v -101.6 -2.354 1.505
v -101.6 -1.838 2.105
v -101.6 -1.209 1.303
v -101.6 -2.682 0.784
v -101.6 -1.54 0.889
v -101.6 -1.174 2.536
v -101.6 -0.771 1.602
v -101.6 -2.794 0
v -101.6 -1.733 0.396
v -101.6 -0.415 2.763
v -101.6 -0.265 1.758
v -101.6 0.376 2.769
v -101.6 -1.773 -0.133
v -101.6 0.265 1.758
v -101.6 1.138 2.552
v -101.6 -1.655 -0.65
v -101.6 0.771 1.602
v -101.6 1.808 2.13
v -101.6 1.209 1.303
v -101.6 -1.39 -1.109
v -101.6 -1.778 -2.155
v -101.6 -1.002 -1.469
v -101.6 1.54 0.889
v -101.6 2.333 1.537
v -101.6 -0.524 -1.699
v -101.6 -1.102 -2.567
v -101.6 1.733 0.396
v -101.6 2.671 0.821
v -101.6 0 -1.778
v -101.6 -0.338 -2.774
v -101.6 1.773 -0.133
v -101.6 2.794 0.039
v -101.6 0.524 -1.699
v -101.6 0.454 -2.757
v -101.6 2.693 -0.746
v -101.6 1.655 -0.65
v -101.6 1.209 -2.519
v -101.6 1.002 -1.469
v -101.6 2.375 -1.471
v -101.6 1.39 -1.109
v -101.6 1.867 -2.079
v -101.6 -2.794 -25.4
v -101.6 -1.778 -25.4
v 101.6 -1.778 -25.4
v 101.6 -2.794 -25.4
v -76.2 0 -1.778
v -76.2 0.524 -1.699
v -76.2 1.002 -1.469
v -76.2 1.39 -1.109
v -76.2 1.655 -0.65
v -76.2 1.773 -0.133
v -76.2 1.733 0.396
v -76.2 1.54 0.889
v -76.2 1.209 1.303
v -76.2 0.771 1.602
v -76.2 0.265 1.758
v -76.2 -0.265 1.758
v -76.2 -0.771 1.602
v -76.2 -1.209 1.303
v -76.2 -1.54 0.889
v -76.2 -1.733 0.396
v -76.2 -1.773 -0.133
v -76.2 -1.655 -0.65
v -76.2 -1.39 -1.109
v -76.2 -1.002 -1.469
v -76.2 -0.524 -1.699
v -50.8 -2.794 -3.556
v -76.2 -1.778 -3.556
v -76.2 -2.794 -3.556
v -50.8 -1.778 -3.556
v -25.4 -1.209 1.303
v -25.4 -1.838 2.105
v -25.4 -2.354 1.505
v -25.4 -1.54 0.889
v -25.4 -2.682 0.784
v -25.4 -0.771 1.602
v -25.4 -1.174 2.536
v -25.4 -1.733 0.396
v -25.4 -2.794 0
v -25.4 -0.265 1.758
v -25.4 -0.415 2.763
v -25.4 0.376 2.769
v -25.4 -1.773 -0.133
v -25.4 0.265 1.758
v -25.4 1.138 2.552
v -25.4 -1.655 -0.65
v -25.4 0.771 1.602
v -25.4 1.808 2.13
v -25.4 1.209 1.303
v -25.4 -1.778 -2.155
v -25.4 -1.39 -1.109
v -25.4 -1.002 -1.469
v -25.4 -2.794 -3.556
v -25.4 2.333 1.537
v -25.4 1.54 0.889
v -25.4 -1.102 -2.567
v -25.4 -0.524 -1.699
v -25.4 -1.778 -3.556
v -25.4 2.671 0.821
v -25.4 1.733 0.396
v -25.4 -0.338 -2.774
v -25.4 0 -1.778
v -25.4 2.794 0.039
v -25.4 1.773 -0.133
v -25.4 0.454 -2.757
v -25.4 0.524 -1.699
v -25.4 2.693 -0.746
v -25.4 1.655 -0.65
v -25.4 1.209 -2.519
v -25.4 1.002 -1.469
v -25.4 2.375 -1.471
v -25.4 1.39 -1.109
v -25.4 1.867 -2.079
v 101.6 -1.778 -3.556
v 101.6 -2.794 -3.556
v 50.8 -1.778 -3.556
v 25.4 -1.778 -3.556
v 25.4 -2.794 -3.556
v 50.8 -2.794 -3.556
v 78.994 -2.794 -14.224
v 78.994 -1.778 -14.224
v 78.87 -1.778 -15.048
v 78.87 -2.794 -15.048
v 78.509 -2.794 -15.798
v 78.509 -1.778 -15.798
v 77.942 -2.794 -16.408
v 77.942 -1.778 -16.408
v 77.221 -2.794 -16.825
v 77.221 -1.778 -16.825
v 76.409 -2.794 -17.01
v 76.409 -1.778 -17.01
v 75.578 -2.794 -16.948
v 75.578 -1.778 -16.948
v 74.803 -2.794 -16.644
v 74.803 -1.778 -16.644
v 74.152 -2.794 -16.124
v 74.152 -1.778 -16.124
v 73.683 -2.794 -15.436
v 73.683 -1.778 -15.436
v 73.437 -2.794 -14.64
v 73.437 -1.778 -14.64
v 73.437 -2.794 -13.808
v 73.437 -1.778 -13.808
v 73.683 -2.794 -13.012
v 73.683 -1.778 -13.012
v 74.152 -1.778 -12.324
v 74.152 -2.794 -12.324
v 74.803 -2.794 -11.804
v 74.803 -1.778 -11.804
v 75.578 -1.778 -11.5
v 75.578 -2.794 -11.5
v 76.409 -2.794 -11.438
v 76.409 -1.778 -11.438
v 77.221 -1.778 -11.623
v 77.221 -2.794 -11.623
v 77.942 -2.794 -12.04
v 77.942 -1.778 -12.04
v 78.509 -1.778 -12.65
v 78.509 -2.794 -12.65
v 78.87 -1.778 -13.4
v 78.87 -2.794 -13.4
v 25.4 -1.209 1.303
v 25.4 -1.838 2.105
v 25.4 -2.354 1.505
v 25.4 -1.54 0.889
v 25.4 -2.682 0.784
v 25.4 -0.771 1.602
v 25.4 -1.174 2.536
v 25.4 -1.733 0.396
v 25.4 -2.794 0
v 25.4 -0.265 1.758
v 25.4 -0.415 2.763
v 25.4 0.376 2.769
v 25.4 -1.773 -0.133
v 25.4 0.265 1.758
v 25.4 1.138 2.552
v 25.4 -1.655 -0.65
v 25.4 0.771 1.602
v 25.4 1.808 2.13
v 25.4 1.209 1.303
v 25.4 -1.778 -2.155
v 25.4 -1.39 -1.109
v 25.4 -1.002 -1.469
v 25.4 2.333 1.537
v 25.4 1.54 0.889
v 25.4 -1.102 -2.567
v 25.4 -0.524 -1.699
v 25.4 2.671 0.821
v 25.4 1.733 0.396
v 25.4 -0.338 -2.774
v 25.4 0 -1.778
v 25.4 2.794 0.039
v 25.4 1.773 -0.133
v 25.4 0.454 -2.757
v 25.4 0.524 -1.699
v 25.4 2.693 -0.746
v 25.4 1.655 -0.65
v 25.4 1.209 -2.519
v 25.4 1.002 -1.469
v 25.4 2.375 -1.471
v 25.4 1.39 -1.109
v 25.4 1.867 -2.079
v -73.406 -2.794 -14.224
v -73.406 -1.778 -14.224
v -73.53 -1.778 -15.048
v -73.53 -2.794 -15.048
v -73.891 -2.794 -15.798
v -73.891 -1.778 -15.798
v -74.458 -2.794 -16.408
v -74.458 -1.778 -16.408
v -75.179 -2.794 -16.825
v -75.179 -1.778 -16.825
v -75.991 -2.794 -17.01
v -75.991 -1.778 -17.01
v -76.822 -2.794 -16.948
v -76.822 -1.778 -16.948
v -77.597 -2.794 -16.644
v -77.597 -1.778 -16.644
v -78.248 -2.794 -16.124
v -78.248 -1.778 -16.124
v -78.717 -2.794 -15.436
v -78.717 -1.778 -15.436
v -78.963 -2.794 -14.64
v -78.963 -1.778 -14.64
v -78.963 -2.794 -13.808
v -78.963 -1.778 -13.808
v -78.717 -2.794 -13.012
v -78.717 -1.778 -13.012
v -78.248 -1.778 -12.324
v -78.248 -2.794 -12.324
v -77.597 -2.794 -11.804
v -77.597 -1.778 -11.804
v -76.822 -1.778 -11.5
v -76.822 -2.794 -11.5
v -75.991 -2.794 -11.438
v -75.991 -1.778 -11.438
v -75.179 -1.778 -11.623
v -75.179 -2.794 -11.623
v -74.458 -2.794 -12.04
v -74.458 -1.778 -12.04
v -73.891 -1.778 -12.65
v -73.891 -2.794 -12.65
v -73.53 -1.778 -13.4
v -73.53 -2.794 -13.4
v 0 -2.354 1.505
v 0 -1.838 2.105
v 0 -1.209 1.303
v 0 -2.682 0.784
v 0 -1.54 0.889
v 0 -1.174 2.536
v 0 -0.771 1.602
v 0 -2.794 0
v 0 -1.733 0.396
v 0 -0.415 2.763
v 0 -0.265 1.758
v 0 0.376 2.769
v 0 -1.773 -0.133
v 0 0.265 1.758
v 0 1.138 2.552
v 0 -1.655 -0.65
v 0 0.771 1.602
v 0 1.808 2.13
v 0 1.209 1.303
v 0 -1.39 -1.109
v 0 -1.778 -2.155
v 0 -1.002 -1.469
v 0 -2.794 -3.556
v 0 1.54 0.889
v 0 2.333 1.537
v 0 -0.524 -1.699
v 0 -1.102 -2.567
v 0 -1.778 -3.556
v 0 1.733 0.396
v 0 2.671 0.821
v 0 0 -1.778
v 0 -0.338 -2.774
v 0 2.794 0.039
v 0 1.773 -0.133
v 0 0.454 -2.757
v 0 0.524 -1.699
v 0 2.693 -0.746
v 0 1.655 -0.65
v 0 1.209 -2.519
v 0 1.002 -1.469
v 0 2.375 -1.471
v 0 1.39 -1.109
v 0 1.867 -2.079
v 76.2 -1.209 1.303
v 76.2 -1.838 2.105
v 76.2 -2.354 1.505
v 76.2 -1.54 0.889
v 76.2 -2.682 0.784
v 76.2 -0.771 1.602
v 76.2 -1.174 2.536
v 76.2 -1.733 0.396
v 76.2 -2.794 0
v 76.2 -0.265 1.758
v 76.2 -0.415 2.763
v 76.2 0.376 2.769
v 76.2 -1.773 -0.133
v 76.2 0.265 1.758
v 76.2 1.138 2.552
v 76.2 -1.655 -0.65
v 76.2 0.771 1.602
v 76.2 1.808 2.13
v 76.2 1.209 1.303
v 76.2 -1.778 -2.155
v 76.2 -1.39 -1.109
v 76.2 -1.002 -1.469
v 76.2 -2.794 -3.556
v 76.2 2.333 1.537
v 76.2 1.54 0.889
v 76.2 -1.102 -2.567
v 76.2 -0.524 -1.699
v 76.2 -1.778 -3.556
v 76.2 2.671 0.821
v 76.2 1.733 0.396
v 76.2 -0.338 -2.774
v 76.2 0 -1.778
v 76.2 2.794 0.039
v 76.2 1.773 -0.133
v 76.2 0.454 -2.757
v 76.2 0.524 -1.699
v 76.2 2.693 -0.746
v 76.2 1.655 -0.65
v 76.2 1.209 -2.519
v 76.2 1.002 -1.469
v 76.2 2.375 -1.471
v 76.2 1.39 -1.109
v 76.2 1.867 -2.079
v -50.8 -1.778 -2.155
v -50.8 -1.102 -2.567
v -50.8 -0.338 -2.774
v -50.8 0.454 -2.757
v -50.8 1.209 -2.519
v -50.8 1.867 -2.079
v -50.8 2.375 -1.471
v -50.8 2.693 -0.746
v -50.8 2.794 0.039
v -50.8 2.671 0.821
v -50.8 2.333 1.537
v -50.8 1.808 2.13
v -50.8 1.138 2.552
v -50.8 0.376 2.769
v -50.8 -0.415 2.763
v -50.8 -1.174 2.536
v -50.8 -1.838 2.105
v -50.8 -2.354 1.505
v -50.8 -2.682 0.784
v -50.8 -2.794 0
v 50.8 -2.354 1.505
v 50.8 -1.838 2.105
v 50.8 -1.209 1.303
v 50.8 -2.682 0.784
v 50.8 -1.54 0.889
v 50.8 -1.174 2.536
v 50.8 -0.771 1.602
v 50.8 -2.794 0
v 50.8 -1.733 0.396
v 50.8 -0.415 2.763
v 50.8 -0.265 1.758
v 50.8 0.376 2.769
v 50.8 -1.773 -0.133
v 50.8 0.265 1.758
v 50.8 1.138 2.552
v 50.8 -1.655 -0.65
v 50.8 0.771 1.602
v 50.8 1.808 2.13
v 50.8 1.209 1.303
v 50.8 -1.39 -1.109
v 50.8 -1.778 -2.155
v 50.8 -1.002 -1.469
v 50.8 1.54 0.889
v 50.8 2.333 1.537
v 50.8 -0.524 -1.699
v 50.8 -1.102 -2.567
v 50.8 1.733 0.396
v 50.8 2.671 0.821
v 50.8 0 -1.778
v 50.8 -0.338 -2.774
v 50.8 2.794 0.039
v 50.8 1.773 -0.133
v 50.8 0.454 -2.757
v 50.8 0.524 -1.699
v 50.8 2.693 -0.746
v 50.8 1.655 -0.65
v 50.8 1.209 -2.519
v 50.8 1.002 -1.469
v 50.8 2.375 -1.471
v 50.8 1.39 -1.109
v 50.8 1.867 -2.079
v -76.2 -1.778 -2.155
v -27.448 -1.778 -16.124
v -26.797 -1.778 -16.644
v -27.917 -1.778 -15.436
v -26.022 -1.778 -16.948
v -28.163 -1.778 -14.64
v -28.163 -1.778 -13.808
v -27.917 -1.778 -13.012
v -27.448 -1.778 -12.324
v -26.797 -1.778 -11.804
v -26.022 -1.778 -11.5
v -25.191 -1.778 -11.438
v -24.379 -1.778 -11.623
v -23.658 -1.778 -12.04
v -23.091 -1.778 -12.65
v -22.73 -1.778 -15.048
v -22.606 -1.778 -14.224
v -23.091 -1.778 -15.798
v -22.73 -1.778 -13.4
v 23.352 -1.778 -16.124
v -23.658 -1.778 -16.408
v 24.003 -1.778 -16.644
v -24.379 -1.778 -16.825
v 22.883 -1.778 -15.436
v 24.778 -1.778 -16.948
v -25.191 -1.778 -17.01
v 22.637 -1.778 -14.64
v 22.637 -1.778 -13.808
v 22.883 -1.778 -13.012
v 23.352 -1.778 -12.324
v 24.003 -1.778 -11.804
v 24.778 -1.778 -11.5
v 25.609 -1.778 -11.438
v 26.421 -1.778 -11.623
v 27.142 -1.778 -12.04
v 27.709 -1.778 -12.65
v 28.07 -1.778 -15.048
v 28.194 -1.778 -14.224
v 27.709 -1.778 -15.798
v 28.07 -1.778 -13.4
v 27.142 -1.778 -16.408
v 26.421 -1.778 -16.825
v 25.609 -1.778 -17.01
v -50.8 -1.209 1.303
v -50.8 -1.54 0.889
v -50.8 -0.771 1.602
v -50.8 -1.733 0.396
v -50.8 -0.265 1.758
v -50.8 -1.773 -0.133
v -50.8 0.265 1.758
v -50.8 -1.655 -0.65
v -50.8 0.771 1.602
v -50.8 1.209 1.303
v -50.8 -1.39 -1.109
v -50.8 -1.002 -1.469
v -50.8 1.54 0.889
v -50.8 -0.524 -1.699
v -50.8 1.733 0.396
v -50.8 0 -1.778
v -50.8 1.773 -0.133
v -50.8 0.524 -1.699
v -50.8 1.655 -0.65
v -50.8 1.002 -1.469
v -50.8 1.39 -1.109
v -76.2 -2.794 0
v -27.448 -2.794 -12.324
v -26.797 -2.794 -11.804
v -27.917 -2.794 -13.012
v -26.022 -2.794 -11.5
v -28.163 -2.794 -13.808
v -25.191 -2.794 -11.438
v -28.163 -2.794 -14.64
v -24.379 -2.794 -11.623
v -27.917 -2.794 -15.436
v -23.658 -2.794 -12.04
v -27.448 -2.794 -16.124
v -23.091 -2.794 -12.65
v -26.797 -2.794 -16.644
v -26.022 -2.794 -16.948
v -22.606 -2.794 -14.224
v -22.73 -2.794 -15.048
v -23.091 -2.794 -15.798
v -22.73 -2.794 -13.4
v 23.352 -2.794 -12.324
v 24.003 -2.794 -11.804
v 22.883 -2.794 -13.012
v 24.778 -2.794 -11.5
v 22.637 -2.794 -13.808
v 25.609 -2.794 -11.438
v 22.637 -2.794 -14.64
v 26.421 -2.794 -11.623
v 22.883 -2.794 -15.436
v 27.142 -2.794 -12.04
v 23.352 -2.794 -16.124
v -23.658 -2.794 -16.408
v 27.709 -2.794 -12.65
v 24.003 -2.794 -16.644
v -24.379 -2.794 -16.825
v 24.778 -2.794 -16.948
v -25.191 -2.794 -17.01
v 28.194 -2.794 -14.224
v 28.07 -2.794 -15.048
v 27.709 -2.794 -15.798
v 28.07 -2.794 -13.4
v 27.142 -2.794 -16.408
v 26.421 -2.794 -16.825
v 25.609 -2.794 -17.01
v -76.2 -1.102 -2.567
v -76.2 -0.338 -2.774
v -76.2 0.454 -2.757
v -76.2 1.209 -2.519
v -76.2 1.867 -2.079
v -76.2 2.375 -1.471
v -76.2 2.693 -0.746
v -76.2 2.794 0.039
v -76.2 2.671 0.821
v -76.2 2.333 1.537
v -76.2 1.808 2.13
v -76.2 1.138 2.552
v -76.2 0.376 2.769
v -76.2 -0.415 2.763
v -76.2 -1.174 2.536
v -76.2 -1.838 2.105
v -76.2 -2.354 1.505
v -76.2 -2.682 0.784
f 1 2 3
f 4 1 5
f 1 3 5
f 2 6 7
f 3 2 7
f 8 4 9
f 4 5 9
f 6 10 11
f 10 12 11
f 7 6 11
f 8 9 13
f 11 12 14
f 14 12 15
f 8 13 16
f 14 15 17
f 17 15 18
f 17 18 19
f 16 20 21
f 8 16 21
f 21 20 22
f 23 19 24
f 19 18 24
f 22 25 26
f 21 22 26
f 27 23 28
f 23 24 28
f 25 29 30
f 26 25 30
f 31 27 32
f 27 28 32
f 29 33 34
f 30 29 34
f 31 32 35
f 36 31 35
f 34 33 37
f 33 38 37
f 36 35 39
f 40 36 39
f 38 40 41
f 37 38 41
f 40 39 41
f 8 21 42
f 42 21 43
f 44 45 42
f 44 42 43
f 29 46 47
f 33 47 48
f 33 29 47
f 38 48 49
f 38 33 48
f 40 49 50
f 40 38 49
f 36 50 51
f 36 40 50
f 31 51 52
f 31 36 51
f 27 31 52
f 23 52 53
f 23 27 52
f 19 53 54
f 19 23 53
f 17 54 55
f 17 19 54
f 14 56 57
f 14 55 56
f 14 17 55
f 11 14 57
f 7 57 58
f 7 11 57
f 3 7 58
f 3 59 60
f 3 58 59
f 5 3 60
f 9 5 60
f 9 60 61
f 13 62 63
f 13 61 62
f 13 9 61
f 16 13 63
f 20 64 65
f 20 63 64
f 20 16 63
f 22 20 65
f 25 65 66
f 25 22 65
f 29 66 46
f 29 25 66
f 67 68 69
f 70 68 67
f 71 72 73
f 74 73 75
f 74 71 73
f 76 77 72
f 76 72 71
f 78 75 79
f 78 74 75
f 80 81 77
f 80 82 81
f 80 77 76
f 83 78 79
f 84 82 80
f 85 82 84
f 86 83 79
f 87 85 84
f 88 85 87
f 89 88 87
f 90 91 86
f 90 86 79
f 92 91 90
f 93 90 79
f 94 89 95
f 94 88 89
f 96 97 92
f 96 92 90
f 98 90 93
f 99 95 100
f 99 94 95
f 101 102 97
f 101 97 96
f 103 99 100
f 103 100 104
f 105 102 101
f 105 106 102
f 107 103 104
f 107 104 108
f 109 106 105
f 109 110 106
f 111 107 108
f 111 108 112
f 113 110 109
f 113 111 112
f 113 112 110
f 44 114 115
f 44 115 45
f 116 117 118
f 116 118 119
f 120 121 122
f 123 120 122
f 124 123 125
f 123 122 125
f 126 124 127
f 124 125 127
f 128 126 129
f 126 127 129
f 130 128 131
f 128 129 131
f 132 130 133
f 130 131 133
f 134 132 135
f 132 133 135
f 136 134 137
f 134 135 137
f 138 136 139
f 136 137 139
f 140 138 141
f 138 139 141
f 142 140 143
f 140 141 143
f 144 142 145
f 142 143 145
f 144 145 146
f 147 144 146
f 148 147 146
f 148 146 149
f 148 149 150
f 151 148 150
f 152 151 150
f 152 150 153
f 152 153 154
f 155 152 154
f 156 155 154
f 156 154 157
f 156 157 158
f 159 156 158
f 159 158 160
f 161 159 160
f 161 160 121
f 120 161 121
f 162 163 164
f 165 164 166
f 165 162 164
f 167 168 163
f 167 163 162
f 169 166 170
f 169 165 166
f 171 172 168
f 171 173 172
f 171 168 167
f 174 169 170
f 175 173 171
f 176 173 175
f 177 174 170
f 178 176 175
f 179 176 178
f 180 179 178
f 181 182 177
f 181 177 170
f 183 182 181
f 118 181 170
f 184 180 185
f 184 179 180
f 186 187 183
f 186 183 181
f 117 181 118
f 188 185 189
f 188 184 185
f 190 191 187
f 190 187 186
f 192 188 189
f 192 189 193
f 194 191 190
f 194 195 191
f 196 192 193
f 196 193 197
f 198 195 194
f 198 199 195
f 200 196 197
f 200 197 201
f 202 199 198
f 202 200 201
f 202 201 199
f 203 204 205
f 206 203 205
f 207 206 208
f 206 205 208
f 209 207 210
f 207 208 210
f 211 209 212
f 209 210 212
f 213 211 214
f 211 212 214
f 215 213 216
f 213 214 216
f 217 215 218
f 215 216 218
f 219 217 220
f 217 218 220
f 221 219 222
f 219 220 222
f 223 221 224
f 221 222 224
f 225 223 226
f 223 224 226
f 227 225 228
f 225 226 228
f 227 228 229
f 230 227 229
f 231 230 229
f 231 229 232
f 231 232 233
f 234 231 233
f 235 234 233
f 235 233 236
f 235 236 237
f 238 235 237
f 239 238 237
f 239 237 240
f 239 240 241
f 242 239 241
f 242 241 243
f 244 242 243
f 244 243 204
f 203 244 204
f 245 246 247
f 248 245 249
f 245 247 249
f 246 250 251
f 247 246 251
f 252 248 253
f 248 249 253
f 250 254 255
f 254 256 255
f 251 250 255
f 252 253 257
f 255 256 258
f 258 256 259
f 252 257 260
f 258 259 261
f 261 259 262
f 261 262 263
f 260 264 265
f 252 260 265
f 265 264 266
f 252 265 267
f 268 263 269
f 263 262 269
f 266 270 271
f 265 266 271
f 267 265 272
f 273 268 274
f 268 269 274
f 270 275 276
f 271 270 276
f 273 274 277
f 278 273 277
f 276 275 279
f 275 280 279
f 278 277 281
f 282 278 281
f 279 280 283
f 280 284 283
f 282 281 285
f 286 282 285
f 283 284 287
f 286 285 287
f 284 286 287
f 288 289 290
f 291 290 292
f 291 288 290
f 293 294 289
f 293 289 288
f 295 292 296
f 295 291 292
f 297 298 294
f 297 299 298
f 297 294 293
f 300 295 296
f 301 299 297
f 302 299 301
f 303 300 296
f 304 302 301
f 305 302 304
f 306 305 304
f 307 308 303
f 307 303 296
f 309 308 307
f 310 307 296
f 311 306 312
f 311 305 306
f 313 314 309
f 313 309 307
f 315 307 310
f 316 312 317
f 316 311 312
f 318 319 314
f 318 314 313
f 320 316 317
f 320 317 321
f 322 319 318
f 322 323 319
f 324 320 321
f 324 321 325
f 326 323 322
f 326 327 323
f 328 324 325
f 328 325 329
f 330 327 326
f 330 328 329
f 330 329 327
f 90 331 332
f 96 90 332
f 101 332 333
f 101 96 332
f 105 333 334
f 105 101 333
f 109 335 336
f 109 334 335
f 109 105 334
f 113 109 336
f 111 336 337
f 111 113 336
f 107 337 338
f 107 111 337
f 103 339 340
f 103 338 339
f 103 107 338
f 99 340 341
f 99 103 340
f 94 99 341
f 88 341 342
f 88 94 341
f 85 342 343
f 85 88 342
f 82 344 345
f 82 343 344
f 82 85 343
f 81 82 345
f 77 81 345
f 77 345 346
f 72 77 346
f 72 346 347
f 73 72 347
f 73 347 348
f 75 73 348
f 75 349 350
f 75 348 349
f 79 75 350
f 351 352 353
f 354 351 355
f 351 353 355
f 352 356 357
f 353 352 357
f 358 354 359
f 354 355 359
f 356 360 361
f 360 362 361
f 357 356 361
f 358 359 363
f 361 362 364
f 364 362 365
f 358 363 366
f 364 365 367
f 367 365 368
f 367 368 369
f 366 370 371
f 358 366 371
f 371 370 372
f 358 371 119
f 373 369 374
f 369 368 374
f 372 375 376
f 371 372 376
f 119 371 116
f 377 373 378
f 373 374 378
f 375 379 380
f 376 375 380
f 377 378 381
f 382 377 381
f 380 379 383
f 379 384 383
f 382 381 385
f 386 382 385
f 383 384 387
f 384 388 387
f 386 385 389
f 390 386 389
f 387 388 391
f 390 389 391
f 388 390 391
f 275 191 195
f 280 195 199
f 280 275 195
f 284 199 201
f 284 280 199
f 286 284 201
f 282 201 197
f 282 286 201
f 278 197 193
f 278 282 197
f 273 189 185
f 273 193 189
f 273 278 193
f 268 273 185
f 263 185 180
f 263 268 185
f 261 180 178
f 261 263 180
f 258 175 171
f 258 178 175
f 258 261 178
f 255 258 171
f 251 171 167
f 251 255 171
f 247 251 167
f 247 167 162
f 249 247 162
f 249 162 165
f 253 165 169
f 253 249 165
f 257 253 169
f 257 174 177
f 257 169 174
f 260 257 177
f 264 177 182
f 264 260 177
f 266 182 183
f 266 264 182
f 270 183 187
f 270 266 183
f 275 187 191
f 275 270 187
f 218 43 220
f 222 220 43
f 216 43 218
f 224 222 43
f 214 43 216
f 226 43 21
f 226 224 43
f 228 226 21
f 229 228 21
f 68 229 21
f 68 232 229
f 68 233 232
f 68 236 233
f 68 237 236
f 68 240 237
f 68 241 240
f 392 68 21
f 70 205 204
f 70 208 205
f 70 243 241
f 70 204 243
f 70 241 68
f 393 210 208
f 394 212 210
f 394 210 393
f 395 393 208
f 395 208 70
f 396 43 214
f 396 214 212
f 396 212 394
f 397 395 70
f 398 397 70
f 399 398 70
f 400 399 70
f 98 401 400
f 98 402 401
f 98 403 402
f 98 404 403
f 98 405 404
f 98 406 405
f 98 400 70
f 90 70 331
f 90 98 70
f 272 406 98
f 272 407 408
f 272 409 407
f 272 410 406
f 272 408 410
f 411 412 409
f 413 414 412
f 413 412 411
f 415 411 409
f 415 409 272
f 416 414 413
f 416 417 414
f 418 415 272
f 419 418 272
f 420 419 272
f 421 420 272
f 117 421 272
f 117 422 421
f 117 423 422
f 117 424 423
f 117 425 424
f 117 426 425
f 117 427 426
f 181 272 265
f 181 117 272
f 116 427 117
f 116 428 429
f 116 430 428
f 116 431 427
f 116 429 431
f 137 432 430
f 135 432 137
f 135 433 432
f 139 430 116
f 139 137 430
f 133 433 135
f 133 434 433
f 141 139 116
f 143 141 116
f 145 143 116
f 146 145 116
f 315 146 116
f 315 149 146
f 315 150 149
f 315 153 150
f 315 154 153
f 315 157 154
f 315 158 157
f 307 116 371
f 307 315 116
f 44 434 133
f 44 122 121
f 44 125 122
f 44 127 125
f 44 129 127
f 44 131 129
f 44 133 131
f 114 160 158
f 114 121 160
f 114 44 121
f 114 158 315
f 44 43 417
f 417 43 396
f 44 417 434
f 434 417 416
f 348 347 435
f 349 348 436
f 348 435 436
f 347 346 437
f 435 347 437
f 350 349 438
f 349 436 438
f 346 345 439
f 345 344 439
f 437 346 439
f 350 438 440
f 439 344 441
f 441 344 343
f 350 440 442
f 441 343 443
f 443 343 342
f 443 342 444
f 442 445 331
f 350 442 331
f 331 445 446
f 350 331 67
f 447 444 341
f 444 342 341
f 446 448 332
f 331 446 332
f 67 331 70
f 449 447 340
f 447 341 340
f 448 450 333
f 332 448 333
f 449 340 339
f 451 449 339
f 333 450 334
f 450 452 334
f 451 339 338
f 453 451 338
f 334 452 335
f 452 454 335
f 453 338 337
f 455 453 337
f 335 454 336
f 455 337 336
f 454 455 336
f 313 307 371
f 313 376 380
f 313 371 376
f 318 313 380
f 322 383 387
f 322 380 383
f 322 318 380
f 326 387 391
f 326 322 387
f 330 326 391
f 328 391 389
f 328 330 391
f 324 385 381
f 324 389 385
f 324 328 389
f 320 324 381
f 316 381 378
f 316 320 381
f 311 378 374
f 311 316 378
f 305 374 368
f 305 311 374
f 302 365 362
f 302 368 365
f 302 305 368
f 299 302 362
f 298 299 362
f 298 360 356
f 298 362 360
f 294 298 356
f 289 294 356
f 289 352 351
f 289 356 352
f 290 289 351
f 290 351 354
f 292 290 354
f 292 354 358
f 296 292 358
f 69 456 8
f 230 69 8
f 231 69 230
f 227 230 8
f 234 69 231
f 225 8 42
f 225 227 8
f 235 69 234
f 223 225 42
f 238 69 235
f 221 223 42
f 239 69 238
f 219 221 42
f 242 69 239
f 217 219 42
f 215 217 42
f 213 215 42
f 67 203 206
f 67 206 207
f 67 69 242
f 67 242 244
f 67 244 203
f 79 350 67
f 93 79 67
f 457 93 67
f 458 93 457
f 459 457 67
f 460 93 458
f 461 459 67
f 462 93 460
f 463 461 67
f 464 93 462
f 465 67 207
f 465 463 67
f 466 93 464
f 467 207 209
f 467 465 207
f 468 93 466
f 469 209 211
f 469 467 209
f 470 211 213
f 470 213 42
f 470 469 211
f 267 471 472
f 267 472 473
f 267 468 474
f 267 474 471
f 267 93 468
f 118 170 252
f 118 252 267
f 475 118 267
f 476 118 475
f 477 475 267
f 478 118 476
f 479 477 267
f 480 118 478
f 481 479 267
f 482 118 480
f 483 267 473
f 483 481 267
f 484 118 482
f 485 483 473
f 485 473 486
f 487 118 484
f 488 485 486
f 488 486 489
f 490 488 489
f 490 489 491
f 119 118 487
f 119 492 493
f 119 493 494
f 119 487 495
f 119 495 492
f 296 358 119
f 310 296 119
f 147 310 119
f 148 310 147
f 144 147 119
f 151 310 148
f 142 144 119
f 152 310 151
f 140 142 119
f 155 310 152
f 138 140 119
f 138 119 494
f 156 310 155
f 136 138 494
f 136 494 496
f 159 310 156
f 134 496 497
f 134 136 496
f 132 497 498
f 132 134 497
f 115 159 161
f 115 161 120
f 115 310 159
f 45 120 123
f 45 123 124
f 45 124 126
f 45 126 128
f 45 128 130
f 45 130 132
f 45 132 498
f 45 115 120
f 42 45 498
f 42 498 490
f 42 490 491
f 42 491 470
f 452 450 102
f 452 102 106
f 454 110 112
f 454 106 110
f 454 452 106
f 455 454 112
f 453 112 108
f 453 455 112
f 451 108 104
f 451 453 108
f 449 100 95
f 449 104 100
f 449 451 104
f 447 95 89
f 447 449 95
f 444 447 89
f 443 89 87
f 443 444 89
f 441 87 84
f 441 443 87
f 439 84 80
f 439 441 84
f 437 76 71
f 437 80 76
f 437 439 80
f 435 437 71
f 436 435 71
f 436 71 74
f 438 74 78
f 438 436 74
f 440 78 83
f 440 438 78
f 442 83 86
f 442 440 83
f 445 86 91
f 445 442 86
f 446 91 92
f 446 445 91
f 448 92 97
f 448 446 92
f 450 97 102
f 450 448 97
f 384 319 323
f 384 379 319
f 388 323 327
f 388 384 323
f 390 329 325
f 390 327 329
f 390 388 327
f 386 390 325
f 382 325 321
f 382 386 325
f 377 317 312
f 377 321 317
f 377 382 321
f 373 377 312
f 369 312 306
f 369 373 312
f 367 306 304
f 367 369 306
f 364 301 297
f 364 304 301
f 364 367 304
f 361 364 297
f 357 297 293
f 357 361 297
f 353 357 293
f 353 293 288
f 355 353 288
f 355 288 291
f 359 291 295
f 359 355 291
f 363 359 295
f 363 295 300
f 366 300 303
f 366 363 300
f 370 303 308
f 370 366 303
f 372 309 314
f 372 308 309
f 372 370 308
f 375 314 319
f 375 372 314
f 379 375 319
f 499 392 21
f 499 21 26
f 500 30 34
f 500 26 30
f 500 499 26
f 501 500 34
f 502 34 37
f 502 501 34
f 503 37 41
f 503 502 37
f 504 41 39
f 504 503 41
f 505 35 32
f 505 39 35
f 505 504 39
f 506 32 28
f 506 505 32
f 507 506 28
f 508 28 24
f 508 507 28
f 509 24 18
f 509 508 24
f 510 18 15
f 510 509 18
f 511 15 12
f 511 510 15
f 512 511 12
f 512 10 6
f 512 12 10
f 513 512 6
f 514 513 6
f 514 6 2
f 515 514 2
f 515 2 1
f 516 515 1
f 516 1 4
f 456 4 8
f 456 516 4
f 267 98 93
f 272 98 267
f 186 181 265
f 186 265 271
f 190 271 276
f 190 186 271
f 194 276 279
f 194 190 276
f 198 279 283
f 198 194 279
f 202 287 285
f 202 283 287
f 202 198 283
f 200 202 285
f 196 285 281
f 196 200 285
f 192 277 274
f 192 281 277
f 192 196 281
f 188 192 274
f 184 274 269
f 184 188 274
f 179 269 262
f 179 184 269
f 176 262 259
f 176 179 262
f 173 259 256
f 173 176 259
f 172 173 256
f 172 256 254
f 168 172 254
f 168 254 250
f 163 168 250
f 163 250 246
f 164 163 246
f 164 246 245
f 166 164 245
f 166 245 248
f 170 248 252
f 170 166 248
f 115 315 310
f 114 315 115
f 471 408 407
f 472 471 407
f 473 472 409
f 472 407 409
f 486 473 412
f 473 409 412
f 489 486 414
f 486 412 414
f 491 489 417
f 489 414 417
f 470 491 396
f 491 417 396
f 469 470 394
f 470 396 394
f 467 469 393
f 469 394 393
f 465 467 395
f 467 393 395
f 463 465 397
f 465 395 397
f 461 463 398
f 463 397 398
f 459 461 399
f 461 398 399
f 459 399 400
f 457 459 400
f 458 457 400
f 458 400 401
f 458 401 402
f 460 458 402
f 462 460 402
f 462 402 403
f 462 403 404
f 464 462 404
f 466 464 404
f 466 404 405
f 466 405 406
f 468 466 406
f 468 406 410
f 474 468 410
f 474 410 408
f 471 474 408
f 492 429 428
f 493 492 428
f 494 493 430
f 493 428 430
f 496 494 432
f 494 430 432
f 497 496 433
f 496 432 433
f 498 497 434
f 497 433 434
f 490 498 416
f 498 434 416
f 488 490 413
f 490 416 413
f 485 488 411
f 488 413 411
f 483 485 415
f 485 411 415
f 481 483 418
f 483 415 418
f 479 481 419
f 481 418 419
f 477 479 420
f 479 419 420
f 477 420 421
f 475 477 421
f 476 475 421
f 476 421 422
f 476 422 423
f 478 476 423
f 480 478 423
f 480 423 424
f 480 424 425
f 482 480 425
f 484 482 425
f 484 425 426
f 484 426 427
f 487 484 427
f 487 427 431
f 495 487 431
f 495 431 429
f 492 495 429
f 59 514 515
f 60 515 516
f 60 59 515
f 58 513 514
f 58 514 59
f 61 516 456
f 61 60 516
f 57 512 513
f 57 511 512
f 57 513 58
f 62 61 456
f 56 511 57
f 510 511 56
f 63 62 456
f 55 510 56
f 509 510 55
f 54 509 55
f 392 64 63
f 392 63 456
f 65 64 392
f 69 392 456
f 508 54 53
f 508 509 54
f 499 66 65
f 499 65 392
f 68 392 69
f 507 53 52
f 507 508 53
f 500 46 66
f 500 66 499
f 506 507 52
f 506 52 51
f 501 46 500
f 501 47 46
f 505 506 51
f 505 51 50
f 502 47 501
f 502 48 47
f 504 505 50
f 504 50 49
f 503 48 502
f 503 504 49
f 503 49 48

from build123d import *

# Parameters (mm, degrees)
SKETCH1_R           = 1.778
BOSS_EXTRUDE1_DEPTH = 101.6
SKETCH2_R           = 2.794
SKETCH2_W           = 25.4
SKETCH2_H           = 6.35
CUT_EXTRUDE1_DEPTH  = 914.4
LPATTERN1_COUNT     = 3
LPATTERN1_PITCH     = 50.8
LPATTERN2_COUNT     = 3
LPATTERN2_PITCH     = 50.8


with BuildPart() as part:
    # Sketch1 → Boss-Extrude1 (new body, symmetric)
    with BuildSketch(Plane(origin=(0, 0, 0), x_dir=(0, 0, -1), z_dir=(1, 0, 0))):
        with BuildLine():
            Line((0, -2.794), (25.4, -2.794))
            Line((25.4, -2.794), (25.4, -1.778))
            Line((25.4, -1.778), (2.155261469, -1.778))
            ThreePointArc((2.155261469, -1.778), (-1.191365603, 2.52726809), (0, -2.794))
        make_face()
        Circle(SKETCH1_R, mode=Mode.SUBTRACT)
    extrude(amount=BOSS_EXTRUDE1_DEPTH, both=True)

    # Sketch2 → Cut-Extrude1 (cut, symmetric)
    with BuildSketch(Plane(origin=(0, -1.778, 0), x_dir=(1, 0, 0), z_dir=(0, 1, 0))):
        with Locations((-25.4, 14.224)):
            Circle(SKETCH2_R)
        with Locations((-12.7, 0.381)):
            Rectangle(SKETCH2_W, SKETCH2_H)
    cut_extrude1 = extrude(amount=CUT_EXTRUDE1_DEPTH, both=True, mode=Mode.SUBTRACT)

    # LPattern1: Cut-Extrude1 ×3
    with Locations(*[(-i * LPATTERN1_PITCH, 0, 0) for i in range(1, LPATTERN1_COUNT)]):
        add(cut_extrude1, mode=Mode.SUBTRACT)

    # LPattern2: Cut-Extrude1 ×3
    with Locations(*[(i * LPATTERN2_PITCH, 0, 0) for i in range(1, LPATTERN2_COUNT)]):
        add(cut_extrude1, mode=Mode.SUBTRACT)


solid = part.part
